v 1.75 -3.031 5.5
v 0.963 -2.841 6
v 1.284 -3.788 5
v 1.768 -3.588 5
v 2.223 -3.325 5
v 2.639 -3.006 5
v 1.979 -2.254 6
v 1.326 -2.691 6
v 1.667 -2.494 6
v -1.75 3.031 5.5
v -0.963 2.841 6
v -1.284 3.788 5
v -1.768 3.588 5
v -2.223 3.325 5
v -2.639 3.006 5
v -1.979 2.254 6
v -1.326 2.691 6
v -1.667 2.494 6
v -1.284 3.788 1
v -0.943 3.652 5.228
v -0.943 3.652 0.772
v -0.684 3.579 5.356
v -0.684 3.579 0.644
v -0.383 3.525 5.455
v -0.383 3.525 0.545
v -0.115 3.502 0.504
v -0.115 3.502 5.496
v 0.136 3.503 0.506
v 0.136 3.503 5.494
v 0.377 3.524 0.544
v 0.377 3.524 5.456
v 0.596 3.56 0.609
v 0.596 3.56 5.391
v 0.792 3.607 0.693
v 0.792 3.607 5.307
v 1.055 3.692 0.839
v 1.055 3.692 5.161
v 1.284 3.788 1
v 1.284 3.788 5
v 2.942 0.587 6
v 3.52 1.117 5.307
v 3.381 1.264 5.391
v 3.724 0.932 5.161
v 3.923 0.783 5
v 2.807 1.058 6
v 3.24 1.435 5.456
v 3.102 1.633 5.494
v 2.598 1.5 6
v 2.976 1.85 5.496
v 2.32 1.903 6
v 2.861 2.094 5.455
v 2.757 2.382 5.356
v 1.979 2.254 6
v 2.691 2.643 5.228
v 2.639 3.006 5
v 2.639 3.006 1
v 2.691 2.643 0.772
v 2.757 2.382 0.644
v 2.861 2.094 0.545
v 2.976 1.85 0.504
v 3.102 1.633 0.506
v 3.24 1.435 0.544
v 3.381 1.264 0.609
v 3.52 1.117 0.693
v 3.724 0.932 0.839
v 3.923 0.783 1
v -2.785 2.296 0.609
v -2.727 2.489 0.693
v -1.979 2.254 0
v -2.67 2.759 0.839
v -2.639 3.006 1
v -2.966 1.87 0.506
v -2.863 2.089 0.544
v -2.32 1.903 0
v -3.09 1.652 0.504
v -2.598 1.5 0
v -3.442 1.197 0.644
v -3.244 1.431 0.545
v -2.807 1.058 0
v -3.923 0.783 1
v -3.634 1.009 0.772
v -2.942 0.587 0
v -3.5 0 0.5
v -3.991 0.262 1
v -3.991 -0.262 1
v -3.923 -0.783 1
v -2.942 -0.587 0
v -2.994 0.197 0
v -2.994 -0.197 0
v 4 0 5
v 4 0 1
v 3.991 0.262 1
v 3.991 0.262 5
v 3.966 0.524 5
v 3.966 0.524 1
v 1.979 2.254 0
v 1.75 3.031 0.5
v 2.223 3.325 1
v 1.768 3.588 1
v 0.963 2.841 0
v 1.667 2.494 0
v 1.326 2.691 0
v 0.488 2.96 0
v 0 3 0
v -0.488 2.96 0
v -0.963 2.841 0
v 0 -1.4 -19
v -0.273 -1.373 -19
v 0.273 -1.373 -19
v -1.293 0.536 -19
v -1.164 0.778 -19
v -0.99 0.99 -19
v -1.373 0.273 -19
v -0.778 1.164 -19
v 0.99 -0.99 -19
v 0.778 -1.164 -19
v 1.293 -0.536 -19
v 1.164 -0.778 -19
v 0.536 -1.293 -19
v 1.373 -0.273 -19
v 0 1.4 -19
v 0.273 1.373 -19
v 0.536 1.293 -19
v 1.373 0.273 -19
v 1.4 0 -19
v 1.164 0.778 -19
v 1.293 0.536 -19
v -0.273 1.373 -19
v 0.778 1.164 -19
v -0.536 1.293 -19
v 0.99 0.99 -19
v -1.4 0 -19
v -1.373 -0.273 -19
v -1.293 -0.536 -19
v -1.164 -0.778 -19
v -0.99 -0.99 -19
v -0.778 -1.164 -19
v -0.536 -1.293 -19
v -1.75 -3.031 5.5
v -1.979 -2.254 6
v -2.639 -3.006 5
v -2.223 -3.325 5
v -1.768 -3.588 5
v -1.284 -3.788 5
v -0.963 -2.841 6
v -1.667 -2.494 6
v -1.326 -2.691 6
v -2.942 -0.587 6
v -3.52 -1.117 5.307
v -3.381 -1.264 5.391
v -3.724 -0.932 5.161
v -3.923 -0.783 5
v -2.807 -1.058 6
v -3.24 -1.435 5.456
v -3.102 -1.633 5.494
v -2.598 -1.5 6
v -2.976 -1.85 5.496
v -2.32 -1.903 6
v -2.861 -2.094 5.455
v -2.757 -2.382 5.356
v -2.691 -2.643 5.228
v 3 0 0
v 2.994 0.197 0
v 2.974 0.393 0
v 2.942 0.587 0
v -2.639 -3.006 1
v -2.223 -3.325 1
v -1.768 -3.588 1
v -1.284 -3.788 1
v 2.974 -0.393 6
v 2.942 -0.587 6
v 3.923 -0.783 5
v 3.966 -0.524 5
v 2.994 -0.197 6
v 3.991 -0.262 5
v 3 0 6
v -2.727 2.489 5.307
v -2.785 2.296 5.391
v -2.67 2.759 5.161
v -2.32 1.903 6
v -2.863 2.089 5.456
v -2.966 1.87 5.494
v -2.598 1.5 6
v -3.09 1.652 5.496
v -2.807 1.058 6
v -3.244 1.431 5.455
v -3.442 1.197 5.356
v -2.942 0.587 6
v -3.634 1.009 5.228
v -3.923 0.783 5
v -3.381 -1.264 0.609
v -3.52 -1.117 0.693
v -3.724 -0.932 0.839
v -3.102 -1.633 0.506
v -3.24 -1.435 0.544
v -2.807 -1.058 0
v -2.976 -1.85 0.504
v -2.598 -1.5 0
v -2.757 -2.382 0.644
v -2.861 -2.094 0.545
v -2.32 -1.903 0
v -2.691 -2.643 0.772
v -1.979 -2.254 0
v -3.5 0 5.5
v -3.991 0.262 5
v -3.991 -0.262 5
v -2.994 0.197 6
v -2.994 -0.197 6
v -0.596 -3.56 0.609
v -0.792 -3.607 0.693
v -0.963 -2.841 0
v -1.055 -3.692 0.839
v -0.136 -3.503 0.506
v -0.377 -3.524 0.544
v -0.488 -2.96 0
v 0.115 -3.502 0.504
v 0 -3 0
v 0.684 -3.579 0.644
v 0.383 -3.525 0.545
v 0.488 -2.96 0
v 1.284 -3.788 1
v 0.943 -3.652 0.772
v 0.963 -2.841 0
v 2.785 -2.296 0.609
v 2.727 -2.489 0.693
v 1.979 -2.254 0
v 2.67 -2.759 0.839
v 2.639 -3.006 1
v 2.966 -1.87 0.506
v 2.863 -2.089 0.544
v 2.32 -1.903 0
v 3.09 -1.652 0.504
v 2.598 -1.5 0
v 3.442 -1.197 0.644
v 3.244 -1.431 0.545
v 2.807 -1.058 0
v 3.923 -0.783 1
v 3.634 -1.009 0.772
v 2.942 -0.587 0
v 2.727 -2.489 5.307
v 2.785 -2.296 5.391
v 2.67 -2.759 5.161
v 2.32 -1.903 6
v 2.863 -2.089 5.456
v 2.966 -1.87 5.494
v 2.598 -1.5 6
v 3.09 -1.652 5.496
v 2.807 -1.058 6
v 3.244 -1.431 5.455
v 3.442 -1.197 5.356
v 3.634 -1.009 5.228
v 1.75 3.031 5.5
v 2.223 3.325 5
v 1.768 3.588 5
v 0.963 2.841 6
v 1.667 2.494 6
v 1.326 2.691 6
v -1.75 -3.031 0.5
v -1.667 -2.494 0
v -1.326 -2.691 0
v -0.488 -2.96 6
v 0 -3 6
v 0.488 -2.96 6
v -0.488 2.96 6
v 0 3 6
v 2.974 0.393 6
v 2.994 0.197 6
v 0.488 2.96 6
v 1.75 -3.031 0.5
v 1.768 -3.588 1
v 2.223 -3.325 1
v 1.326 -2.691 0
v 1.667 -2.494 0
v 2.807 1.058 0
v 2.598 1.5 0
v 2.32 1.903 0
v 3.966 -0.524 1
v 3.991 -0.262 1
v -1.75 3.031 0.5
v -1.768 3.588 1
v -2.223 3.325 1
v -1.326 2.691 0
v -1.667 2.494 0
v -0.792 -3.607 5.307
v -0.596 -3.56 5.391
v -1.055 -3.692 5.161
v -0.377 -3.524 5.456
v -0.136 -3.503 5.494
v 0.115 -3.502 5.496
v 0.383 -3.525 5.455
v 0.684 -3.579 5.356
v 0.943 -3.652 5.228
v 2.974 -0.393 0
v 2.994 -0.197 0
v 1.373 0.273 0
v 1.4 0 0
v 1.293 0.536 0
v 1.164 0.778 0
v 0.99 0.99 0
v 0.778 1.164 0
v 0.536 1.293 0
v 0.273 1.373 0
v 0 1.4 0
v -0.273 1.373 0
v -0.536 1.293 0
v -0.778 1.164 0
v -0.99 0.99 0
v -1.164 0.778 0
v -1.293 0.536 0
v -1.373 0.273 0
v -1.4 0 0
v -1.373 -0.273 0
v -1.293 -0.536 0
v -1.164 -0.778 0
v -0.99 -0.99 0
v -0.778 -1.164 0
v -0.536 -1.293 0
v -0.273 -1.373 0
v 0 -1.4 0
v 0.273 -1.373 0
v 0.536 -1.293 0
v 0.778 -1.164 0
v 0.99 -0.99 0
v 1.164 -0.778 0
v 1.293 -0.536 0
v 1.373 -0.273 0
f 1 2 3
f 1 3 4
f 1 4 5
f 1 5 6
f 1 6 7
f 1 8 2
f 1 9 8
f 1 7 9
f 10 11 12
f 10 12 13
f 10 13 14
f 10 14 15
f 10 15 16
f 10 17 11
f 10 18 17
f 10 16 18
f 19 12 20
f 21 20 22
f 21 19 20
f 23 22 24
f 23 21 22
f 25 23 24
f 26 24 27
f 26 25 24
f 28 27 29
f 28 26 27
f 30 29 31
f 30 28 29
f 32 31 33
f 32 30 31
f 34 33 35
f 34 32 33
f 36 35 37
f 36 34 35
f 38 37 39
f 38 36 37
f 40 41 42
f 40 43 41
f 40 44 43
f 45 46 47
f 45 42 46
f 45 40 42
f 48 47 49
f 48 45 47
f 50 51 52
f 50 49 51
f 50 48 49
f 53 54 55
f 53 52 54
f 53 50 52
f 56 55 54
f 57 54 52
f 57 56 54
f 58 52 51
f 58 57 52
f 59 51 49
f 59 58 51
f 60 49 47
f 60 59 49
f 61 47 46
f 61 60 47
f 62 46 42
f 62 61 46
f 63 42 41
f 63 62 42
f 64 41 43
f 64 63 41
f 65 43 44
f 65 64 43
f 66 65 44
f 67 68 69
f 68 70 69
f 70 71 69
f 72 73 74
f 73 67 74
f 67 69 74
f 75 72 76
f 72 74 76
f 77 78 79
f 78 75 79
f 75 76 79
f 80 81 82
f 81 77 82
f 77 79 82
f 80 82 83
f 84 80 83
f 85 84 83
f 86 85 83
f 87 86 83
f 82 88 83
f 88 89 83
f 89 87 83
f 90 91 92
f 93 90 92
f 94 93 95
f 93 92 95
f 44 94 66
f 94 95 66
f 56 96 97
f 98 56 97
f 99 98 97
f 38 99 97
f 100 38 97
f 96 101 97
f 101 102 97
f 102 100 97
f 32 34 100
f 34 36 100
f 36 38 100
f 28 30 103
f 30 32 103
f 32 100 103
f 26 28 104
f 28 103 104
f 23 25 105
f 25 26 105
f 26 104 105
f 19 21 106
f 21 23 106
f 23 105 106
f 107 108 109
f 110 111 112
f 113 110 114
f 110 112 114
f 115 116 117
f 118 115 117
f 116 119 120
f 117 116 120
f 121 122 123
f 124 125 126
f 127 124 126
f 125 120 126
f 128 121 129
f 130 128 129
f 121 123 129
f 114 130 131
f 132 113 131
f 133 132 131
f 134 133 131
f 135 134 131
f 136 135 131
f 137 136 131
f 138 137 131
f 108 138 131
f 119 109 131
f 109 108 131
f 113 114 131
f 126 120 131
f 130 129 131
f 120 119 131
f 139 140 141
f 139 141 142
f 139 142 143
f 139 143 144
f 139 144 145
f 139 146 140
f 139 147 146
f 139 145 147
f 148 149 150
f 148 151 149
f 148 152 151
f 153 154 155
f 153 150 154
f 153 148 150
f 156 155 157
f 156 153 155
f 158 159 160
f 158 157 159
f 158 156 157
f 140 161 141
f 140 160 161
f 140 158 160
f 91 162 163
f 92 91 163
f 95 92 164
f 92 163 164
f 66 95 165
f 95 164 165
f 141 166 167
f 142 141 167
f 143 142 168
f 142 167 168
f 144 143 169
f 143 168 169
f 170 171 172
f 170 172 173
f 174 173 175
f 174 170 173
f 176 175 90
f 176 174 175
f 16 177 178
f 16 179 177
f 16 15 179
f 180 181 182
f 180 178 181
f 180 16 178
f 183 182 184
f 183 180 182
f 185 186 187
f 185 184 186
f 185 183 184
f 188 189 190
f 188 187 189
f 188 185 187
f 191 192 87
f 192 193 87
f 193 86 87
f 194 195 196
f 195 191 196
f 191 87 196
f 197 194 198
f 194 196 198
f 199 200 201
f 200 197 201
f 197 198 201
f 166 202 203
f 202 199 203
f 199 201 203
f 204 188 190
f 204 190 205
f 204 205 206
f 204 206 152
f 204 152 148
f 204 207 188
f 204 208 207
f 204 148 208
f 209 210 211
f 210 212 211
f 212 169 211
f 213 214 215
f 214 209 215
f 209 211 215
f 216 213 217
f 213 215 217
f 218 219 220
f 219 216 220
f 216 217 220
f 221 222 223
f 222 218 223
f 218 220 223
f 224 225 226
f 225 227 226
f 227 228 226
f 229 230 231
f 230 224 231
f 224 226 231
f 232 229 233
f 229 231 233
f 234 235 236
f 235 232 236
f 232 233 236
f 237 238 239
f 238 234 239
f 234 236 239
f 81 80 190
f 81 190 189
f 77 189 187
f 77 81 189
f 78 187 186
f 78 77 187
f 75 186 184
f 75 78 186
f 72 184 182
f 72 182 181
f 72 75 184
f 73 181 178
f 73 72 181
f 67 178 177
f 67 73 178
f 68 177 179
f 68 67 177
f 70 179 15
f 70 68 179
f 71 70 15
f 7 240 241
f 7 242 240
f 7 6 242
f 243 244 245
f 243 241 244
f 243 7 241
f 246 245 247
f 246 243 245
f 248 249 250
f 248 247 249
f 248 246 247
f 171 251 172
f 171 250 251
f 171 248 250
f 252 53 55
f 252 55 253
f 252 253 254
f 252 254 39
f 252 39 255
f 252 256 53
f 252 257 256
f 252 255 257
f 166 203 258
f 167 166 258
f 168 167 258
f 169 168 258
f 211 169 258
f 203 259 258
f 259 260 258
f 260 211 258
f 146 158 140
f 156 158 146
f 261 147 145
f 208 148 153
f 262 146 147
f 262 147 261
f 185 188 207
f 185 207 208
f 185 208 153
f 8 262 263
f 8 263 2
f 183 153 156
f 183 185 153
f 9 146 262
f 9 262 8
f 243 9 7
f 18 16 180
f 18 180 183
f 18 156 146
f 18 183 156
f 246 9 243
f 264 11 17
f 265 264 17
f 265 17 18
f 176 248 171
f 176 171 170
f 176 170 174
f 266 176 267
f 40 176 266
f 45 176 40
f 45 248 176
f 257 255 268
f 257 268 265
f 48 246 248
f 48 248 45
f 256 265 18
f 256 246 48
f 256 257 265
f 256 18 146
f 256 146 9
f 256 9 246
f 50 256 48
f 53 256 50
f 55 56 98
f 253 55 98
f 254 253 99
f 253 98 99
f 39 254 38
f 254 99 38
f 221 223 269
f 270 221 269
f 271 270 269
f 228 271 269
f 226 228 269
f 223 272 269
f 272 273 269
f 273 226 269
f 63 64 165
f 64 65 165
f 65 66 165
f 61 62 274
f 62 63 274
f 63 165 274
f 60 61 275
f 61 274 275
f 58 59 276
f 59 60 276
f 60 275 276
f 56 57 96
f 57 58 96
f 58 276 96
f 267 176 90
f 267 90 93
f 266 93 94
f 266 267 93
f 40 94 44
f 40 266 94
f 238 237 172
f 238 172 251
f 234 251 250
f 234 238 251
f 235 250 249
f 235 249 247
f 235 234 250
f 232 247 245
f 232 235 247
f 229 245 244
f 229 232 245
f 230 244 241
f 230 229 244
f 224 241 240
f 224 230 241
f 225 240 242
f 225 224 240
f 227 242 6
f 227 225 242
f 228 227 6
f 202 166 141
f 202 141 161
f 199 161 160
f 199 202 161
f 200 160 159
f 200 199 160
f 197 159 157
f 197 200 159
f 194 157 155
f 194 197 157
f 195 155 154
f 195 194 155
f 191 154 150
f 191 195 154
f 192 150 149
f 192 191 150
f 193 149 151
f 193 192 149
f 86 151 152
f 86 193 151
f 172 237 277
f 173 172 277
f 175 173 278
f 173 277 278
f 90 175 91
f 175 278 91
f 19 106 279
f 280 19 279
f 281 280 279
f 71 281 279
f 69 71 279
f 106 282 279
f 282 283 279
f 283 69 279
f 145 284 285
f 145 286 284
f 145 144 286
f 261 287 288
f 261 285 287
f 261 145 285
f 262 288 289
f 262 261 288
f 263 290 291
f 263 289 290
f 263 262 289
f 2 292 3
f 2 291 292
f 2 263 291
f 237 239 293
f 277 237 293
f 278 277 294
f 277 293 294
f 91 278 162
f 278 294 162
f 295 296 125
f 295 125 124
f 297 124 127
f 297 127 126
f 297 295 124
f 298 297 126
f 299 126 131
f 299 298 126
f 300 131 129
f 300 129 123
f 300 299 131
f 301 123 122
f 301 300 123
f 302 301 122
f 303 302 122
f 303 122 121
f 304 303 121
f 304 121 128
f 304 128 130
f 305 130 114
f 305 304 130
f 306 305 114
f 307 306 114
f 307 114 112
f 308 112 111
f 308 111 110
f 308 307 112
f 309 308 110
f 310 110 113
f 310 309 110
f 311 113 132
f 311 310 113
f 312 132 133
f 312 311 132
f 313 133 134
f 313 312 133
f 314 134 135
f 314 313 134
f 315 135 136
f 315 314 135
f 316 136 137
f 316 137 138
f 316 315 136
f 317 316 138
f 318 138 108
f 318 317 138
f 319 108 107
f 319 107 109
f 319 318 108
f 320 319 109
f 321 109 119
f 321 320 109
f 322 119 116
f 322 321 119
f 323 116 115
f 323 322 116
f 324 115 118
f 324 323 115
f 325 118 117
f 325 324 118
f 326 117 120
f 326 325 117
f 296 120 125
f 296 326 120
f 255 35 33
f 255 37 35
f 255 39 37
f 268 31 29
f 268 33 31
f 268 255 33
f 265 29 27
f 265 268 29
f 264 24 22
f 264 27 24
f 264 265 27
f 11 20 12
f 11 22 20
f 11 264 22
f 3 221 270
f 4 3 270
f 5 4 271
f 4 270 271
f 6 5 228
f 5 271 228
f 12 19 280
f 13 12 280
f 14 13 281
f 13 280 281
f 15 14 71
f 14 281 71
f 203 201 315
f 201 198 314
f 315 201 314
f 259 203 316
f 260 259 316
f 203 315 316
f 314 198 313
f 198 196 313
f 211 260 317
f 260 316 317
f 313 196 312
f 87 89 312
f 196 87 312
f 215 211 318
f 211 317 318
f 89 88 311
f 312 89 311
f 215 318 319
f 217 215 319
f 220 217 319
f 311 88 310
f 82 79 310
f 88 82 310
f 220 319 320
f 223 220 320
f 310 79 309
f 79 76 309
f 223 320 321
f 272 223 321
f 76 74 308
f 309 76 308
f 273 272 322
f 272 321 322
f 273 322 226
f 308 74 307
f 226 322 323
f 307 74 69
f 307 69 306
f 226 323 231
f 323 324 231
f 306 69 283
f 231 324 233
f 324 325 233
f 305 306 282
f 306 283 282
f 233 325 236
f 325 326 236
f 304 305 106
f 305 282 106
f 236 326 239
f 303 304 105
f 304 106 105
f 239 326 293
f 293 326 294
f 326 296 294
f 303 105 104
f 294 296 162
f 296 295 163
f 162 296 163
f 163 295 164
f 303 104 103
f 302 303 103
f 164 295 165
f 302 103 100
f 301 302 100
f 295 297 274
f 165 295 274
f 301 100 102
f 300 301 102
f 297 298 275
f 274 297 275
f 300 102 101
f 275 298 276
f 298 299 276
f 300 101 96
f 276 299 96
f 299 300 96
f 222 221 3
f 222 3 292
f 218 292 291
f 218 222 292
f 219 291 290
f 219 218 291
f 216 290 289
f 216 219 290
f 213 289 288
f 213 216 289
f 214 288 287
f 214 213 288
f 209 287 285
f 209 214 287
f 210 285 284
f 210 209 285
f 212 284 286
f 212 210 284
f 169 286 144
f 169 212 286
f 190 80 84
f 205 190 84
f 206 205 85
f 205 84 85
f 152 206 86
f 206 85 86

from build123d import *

# Parameters (mm, degrees)
F0_R     = 1.4
F1_DEPTH = 6
F2_SIZE  = 1
F3_DEPTH = 6.001
F4_DEPTH = 19


with BuildPart() as f1:
    # F0 (on Top) → F1 (new body)
    with BuildSketch(Plane.XY):
        with BuildLine():
            ThreePointArc((3.9226903411, -0.7826241038), (3.9806256647, -0.3932166296), (4, 0))
            ThreePointArc((4, 0), (3.9806256647, 0.3932166296), (3.9226903411, 0.7826241038))
            ThreePointArc((3.9226903411, 0.7826241038), (3.0310889132, 1.75), (2.639117526, 3.0058374347))
            ThreePointArc((2.639117526, 3.0058374347), (2, 3.4641016151), (1.2835728151, 3.7884615385))
            ThreePointArc((1.2835728151, 3.7884615385), (0, 3.5), (-1.2835728151, 3.7884615385))
            ThreePointArc((-1.2835728151, 3.7884615385), (-2, 3.4641016151), (-2.639117526, 3.0058374347))
            ThreePointArc((-2.639117526, 3.0058374347), (-3.0310889132, 1.75), (-3.9226903411, 0.7826241038))
            ThreePointArc((-3.9226903411, 0.7826241038), (-4, 0), (-3.9226903411, -0.7826241038))
            ThreePointArc((-3.9226903411, -0.7826241038), (-3.0310889132, -1.75), (-2.639117526, -3.0058374347))
            ThreePointArc((-2.639117526, -3.0058374347), (-2, -3.4641016151), (-1.2835728151, -3.7884615385))
            ThreePointArc((-1.2835728151, -3.7884615385), (0, -3.5), (1.2835728151, -3.7884615385))
            ThreePointArc((1.2835728151, -3.7884615385), (2, -3.4641016151), (2.639117526, -3.0058374347))
            ThreePointArc((2.639117526, -3.0058374347), (3.0310889132, -1.75), (3.9226903411, -0.7826241038))
        make_face()
        Circle(F0_R, mode=Mode.SUBTRACT)
        Circle(F0_R)
        with BuildLine():
            ThreePointArc((-1.2835728151, 3.7884615385), (0, 3.5), (1.2835728151, 3.7884615385))
            ThreePointArc((1.2835728151, 3.7884615385), (0, 4), (-1.2835728151, 3.7884615385))
        make_face()
        with BuildLine():
            ThreePointArc((2.639117526, 3.0058374347), (3.0310889132, 1.75), (3.9226903411, 0.7826241038))
            ThreePointArc((3.9226903411, 0.7826241038), (3.4641016151, 2), (2.639117526, 3.0058374347))
        make_face()
        with BuildLine():
            ThreePointArc((2.639117526, -3.0058374347), (3.4641016151, -2), (3.9226903411, -0.7826241038))
            ThreePointArc((3.9226903411, -0.7826241038), (3.0310889132, -1.75), (2.639117526, -3.0058374347))
        make_face()
        with BuildLine():
            ThreePointArc((-1.2835728151, -3.7884615385), (0, -4), (1.2835728151, -3.7884615385))
            ThreePointArc((1.2835728151, -3.7884615385), (0, -3.5), (-1.2835728151, -3.7884615385))
        make_face()
        with BuildLine():
            ThreePointArc((-3.9226903411, -0.7826241038), (-3.4641016151, -2), (-2.639117526, -3.0058374347))
            ThreePointArc((-2.639117526, -3.0058374347), (-3.0310889132, -1.75), (-3.9226903411, -0.7826241038))
        make_face()
        with BuildLine():
            ThreePointArc((-3.9226903411, 0.7826241038), (-3.0310889132, 1.75), (-2.639117526, 3.0058374347))
            ThreePointArc((-2.639117526, 3.0058374347), (-3.4641016151, 2), (-3.9226903411, 0.7826241038))
        make_face()
    extrude(amount=F1_DEPTH)

    # F2
    f2_edges = [f1.edges().sort_by_distance(p)[0] for p in [
        (2.639118, -3.005837, 6),
        (2.639118, -3.005837, 0),
    ]]
    chamfer(f2_edges, length=F2_SIZE)

    # F0 (on Top) → F3 (cut, through all)
    with BuildSketch(Plane.XY):
        with BuildLine():
            ThreePointArc((-1.2835728151, -3.7884615385), (0, -4), (1.2835728151, -3.7884615385))
            ThreePointArc((1.2835728151, -3.7884615385), (0, -3.5), (-1.2835728151, -3.7884615385))
        make_face()
        with BuildLine():
            ThreePointArc((-3.9226903411, -0.7826241038), (-3.4641016151, -2), (-2.639117526, -3.0058374347))
            ThreePointArc((-2.639117526, -3.0058374347), (-3.0310889132, -1.75), (-3.9226903411, -0.7826241038))
        make_face()
        with BuildLine():
            ThreePointArc((2.639117526, -3.0058374347), (3.4641016151, -2), (3.9226903411, -0.7826241038))
            ThreePointArc((3.9226903411, -0.7826241038), (3.0310889132, -1.75), (2.639117526, -3.0058374347))
        make_face()
        with BuildLine():
            ThreePointArc((2.639117526, 3.0058374347), (3.0310889132, 1.75), (3.9226903411, 0.7826241038))
            ThreePointArc((3.9226903411, 0.7826241038), (3.4641016151, 2), (2.639117526, 3.0058374347))
        make_face()
        with BuildLine():
            ThreePointArc((-1.2835728151, 3.7884615385), (0, 3.5), (1.2835728151, 3.7884615385))
            ThreePointArc((1.2835728151, 3.7884615385), (0, 4), (-1.2835728151, 3.7884615385))
        make_face()
        with BuildLine():
            ThreePointArc((-3.9226903411, 0.7826241038), (-3.0310889132, 1.75), (-2.639117526, 3.0058374347))
            ThreePointArc((-2.639117526, 3.0058374347), (-3.4641016151, 2), (-3.9226903411, 0.7826241038))
        make_face()
    extrude(amount=F3_DEPTH, mode=Mode.SUBTRACT)

    # F0 (on Top) → F4 (join)
    with BuildSketch(Plane.XY):
        Circle(F0_R)
    extrude(amount=-F4_DEPTH)


solid = f1.part
